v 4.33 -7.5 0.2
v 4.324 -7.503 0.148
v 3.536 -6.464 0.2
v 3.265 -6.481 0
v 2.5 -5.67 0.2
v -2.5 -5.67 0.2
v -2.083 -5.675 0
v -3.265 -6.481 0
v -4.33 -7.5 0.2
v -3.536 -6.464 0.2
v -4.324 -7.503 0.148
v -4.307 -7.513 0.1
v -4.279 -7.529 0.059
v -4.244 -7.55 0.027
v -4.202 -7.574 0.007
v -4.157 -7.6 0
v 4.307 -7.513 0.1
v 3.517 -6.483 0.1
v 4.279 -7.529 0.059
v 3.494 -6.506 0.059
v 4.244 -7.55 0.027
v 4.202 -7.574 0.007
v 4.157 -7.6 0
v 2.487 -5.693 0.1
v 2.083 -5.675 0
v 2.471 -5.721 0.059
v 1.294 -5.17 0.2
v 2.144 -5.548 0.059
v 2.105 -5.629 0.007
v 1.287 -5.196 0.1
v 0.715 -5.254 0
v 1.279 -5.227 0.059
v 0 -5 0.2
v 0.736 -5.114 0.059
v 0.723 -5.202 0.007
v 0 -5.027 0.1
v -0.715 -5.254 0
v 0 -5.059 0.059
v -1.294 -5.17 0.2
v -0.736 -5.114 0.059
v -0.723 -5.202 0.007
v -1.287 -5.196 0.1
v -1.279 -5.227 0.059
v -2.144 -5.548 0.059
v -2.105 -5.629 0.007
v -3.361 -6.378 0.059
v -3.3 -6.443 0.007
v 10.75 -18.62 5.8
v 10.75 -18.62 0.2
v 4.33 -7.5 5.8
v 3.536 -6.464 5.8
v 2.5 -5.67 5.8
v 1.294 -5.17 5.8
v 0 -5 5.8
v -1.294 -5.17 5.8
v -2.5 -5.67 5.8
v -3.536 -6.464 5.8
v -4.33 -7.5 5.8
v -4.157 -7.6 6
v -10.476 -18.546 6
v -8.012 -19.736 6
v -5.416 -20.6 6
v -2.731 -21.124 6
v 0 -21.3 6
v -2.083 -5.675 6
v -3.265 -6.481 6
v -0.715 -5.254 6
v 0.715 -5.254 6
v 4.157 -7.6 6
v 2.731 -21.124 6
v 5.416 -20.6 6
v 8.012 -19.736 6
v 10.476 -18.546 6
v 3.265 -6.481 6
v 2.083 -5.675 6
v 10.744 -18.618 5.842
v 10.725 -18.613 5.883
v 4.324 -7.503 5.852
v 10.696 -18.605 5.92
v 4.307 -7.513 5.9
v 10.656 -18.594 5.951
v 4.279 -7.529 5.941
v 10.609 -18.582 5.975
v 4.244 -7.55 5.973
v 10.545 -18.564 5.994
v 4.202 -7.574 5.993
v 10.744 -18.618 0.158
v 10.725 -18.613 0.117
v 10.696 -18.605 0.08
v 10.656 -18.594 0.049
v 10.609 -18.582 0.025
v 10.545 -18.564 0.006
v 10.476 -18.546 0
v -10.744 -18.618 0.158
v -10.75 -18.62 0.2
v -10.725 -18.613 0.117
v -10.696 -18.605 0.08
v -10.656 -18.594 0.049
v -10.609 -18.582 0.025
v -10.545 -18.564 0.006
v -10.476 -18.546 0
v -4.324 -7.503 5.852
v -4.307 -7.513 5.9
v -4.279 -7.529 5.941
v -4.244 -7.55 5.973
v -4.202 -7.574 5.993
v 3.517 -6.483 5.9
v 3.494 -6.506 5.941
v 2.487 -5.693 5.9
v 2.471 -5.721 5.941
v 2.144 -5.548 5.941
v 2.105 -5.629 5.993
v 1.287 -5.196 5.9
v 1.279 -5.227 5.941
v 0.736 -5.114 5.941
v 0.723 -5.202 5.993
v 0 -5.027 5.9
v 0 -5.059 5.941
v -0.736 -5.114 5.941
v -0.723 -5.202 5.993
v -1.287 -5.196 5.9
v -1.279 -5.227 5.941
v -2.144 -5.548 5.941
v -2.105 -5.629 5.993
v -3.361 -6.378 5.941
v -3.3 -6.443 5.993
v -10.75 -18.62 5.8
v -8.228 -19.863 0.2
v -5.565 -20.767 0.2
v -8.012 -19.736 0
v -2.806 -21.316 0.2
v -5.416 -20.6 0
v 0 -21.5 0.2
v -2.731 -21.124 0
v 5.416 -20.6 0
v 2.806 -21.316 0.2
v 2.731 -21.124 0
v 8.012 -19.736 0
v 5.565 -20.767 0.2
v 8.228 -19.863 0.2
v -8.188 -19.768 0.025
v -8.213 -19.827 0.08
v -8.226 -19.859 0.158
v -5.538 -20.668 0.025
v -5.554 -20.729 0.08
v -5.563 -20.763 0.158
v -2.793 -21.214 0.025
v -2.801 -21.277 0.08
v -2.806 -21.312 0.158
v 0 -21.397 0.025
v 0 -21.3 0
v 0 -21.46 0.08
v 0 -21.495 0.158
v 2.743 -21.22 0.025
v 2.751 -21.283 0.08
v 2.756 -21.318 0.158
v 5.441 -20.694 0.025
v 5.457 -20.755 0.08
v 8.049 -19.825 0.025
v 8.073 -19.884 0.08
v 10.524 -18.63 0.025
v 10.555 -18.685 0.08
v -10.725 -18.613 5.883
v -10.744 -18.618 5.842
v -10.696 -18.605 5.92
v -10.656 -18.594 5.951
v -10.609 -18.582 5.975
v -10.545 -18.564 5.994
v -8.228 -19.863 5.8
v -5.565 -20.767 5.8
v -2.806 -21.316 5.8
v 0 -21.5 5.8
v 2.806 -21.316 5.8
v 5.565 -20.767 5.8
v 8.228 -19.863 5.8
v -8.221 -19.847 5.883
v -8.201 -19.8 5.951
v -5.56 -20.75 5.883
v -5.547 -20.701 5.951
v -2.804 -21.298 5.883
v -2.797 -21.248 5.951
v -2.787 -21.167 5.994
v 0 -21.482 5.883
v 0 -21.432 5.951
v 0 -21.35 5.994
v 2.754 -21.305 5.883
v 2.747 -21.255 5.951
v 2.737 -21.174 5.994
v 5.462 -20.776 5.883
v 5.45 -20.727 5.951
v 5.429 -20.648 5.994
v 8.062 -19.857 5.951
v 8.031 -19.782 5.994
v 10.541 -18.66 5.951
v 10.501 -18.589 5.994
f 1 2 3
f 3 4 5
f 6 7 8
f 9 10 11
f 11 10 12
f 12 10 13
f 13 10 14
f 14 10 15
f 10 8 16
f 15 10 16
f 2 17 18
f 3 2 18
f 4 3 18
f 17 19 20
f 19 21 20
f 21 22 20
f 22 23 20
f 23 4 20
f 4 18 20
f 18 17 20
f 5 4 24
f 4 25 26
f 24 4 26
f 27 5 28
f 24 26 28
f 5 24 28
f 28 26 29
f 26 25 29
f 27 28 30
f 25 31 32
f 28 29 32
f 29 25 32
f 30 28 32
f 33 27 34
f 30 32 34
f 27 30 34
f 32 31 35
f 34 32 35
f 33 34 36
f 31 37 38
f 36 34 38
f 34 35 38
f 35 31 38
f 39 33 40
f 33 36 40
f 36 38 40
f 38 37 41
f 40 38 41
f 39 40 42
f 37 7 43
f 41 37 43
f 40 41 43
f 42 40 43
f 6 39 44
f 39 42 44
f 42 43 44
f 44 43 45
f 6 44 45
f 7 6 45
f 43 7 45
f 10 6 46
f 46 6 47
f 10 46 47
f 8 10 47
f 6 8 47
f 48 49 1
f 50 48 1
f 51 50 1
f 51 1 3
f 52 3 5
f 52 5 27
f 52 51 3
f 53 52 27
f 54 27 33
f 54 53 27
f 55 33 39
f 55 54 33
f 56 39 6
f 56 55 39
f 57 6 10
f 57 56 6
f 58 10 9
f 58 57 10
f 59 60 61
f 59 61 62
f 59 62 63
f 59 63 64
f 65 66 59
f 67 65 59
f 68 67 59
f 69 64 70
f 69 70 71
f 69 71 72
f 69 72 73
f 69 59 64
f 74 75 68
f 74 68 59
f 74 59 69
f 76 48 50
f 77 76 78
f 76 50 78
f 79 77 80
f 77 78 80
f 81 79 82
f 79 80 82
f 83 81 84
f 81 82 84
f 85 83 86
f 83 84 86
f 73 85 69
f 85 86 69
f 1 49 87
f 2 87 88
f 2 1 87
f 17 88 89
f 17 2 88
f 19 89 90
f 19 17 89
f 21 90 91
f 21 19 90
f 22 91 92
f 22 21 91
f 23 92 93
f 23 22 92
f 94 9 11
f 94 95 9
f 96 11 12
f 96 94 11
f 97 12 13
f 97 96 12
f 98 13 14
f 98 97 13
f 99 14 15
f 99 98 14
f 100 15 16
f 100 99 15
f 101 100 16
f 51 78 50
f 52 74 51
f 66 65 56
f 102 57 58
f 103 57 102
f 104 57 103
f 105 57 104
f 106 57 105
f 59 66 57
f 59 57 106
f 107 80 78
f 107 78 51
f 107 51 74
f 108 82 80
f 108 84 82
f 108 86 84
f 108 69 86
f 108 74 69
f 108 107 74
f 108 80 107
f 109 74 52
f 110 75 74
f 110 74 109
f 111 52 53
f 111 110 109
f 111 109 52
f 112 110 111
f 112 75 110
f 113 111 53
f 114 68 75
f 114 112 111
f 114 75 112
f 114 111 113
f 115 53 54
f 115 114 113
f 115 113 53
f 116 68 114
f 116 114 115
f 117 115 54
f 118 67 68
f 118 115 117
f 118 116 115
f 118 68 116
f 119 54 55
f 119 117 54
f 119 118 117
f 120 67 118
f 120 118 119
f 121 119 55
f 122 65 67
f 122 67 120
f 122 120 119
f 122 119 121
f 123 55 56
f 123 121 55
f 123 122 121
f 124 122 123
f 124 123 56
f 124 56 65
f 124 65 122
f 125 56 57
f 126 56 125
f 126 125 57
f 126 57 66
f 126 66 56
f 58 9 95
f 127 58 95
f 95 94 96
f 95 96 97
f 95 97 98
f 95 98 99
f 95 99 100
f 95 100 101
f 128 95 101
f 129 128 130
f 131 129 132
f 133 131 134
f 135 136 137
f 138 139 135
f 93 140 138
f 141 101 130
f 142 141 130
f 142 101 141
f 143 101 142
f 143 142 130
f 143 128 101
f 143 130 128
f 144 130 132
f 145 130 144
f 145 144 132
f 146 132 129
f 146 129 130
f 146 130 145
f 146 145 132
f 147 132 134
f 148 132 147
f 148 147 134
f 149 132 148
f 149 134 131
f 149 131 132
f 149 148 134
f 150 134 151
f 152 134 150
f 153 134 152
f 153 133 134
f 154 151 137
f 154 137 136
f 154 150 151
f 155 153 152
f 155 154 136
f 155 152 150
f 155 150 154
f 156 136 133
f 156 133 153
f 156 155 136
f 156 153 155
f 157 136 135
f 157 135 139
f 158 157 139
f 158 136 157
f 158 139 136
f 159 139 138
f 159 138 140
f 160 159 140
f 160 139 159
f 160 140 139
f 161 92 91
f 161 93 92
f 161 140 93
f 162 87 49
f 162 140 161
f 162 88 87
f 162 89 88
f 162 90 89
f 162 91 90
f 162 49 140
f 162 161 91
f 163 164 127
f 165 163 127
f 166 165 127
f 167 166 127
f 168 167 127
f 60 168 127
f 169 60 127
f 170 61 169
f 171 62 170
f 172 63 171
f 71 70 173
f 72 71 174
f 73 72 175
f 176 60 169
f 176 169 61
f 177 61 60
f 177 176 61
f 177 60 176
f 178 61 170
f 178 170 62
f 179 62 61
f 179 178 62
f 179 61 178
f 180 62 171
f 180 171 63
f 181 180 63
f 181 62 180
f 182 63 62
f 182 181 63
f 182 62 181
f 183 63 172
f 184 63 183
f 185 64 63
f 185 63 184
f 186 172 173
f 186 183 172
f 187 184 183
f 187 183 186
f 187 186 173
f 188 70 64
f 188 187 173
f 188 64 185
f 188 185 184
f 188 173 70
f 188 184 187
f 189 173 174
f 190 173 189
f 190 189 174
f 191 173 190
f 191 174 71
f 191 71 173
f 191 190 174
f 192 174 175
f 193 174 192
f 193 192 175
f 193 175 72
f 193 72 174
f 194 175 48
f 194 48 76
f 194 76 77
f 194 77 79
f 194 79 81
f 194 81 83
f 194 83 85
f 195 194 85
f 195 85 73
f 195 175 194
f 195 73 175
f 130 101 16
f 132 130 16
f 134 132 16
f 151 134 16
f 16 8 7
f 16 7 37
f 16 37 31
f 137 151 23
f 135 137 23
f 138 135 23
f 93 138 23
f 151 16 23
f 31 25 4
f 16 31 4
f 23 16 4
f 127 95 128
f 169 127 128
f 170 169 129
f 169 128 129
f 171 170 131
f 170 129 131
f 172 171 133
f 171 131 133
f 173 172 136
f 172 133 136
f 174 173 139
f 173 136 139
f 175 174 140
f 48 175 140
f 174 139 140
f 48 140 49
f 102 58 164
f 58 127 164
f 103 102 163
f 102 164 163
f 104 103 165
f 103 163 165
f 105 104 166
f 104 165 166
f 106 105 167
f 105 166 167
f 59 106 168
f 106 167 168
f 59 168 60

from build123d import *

# Parameters (mm, degrees)
F1_DEPTH = 6
F2_R     = 5
F3_R     = 0.2
F4_R     = 0.2


with BuildPart() as f1:
    # F0 (on Top) → F1 (new body)
    with BuildSketch(Plane.XY):
        with BuildLine():
            Line((10.75, -18.6195461814), (0, 0))
            Line((0, 0), (-10.75, -18.6195461814))
            ThreePointArc((-10.75, -18.6195461814), (0, -21.5), (10.75, -18.6195461814))
        make_face()
    extrude(amount=F1_DEPTH)

    # F2
    f2_edges = [f1.edges().sort_by_distance(p)[0] for p in [
        (0, 0, 3),
    ]]
    fillet(f2_edges, radius=F2_R)

    # F3
    f3_edges = [f1.edges().sort_by_distance(p)[0] for p in [
        (7.540064, -13.059773, 6),
        (0, -5, 6),
        (0, -21.5, 6),
        (-7.540064, -13.059773, 6),
    ]]
    fillet(f3_edges, radius=F3_R)

    # F4
    f4_edges = [f1.edges().sort_by_distance(p)[0] for p in [
        (7.540064, -13.059773, 0),
        (0, -5, 0),
        (0, -21.5, 0),
        (-7.540064, -13.059773, 0),
    ]]
    fillet(f4_edges, radius=F4_R)


solid = f1.part
